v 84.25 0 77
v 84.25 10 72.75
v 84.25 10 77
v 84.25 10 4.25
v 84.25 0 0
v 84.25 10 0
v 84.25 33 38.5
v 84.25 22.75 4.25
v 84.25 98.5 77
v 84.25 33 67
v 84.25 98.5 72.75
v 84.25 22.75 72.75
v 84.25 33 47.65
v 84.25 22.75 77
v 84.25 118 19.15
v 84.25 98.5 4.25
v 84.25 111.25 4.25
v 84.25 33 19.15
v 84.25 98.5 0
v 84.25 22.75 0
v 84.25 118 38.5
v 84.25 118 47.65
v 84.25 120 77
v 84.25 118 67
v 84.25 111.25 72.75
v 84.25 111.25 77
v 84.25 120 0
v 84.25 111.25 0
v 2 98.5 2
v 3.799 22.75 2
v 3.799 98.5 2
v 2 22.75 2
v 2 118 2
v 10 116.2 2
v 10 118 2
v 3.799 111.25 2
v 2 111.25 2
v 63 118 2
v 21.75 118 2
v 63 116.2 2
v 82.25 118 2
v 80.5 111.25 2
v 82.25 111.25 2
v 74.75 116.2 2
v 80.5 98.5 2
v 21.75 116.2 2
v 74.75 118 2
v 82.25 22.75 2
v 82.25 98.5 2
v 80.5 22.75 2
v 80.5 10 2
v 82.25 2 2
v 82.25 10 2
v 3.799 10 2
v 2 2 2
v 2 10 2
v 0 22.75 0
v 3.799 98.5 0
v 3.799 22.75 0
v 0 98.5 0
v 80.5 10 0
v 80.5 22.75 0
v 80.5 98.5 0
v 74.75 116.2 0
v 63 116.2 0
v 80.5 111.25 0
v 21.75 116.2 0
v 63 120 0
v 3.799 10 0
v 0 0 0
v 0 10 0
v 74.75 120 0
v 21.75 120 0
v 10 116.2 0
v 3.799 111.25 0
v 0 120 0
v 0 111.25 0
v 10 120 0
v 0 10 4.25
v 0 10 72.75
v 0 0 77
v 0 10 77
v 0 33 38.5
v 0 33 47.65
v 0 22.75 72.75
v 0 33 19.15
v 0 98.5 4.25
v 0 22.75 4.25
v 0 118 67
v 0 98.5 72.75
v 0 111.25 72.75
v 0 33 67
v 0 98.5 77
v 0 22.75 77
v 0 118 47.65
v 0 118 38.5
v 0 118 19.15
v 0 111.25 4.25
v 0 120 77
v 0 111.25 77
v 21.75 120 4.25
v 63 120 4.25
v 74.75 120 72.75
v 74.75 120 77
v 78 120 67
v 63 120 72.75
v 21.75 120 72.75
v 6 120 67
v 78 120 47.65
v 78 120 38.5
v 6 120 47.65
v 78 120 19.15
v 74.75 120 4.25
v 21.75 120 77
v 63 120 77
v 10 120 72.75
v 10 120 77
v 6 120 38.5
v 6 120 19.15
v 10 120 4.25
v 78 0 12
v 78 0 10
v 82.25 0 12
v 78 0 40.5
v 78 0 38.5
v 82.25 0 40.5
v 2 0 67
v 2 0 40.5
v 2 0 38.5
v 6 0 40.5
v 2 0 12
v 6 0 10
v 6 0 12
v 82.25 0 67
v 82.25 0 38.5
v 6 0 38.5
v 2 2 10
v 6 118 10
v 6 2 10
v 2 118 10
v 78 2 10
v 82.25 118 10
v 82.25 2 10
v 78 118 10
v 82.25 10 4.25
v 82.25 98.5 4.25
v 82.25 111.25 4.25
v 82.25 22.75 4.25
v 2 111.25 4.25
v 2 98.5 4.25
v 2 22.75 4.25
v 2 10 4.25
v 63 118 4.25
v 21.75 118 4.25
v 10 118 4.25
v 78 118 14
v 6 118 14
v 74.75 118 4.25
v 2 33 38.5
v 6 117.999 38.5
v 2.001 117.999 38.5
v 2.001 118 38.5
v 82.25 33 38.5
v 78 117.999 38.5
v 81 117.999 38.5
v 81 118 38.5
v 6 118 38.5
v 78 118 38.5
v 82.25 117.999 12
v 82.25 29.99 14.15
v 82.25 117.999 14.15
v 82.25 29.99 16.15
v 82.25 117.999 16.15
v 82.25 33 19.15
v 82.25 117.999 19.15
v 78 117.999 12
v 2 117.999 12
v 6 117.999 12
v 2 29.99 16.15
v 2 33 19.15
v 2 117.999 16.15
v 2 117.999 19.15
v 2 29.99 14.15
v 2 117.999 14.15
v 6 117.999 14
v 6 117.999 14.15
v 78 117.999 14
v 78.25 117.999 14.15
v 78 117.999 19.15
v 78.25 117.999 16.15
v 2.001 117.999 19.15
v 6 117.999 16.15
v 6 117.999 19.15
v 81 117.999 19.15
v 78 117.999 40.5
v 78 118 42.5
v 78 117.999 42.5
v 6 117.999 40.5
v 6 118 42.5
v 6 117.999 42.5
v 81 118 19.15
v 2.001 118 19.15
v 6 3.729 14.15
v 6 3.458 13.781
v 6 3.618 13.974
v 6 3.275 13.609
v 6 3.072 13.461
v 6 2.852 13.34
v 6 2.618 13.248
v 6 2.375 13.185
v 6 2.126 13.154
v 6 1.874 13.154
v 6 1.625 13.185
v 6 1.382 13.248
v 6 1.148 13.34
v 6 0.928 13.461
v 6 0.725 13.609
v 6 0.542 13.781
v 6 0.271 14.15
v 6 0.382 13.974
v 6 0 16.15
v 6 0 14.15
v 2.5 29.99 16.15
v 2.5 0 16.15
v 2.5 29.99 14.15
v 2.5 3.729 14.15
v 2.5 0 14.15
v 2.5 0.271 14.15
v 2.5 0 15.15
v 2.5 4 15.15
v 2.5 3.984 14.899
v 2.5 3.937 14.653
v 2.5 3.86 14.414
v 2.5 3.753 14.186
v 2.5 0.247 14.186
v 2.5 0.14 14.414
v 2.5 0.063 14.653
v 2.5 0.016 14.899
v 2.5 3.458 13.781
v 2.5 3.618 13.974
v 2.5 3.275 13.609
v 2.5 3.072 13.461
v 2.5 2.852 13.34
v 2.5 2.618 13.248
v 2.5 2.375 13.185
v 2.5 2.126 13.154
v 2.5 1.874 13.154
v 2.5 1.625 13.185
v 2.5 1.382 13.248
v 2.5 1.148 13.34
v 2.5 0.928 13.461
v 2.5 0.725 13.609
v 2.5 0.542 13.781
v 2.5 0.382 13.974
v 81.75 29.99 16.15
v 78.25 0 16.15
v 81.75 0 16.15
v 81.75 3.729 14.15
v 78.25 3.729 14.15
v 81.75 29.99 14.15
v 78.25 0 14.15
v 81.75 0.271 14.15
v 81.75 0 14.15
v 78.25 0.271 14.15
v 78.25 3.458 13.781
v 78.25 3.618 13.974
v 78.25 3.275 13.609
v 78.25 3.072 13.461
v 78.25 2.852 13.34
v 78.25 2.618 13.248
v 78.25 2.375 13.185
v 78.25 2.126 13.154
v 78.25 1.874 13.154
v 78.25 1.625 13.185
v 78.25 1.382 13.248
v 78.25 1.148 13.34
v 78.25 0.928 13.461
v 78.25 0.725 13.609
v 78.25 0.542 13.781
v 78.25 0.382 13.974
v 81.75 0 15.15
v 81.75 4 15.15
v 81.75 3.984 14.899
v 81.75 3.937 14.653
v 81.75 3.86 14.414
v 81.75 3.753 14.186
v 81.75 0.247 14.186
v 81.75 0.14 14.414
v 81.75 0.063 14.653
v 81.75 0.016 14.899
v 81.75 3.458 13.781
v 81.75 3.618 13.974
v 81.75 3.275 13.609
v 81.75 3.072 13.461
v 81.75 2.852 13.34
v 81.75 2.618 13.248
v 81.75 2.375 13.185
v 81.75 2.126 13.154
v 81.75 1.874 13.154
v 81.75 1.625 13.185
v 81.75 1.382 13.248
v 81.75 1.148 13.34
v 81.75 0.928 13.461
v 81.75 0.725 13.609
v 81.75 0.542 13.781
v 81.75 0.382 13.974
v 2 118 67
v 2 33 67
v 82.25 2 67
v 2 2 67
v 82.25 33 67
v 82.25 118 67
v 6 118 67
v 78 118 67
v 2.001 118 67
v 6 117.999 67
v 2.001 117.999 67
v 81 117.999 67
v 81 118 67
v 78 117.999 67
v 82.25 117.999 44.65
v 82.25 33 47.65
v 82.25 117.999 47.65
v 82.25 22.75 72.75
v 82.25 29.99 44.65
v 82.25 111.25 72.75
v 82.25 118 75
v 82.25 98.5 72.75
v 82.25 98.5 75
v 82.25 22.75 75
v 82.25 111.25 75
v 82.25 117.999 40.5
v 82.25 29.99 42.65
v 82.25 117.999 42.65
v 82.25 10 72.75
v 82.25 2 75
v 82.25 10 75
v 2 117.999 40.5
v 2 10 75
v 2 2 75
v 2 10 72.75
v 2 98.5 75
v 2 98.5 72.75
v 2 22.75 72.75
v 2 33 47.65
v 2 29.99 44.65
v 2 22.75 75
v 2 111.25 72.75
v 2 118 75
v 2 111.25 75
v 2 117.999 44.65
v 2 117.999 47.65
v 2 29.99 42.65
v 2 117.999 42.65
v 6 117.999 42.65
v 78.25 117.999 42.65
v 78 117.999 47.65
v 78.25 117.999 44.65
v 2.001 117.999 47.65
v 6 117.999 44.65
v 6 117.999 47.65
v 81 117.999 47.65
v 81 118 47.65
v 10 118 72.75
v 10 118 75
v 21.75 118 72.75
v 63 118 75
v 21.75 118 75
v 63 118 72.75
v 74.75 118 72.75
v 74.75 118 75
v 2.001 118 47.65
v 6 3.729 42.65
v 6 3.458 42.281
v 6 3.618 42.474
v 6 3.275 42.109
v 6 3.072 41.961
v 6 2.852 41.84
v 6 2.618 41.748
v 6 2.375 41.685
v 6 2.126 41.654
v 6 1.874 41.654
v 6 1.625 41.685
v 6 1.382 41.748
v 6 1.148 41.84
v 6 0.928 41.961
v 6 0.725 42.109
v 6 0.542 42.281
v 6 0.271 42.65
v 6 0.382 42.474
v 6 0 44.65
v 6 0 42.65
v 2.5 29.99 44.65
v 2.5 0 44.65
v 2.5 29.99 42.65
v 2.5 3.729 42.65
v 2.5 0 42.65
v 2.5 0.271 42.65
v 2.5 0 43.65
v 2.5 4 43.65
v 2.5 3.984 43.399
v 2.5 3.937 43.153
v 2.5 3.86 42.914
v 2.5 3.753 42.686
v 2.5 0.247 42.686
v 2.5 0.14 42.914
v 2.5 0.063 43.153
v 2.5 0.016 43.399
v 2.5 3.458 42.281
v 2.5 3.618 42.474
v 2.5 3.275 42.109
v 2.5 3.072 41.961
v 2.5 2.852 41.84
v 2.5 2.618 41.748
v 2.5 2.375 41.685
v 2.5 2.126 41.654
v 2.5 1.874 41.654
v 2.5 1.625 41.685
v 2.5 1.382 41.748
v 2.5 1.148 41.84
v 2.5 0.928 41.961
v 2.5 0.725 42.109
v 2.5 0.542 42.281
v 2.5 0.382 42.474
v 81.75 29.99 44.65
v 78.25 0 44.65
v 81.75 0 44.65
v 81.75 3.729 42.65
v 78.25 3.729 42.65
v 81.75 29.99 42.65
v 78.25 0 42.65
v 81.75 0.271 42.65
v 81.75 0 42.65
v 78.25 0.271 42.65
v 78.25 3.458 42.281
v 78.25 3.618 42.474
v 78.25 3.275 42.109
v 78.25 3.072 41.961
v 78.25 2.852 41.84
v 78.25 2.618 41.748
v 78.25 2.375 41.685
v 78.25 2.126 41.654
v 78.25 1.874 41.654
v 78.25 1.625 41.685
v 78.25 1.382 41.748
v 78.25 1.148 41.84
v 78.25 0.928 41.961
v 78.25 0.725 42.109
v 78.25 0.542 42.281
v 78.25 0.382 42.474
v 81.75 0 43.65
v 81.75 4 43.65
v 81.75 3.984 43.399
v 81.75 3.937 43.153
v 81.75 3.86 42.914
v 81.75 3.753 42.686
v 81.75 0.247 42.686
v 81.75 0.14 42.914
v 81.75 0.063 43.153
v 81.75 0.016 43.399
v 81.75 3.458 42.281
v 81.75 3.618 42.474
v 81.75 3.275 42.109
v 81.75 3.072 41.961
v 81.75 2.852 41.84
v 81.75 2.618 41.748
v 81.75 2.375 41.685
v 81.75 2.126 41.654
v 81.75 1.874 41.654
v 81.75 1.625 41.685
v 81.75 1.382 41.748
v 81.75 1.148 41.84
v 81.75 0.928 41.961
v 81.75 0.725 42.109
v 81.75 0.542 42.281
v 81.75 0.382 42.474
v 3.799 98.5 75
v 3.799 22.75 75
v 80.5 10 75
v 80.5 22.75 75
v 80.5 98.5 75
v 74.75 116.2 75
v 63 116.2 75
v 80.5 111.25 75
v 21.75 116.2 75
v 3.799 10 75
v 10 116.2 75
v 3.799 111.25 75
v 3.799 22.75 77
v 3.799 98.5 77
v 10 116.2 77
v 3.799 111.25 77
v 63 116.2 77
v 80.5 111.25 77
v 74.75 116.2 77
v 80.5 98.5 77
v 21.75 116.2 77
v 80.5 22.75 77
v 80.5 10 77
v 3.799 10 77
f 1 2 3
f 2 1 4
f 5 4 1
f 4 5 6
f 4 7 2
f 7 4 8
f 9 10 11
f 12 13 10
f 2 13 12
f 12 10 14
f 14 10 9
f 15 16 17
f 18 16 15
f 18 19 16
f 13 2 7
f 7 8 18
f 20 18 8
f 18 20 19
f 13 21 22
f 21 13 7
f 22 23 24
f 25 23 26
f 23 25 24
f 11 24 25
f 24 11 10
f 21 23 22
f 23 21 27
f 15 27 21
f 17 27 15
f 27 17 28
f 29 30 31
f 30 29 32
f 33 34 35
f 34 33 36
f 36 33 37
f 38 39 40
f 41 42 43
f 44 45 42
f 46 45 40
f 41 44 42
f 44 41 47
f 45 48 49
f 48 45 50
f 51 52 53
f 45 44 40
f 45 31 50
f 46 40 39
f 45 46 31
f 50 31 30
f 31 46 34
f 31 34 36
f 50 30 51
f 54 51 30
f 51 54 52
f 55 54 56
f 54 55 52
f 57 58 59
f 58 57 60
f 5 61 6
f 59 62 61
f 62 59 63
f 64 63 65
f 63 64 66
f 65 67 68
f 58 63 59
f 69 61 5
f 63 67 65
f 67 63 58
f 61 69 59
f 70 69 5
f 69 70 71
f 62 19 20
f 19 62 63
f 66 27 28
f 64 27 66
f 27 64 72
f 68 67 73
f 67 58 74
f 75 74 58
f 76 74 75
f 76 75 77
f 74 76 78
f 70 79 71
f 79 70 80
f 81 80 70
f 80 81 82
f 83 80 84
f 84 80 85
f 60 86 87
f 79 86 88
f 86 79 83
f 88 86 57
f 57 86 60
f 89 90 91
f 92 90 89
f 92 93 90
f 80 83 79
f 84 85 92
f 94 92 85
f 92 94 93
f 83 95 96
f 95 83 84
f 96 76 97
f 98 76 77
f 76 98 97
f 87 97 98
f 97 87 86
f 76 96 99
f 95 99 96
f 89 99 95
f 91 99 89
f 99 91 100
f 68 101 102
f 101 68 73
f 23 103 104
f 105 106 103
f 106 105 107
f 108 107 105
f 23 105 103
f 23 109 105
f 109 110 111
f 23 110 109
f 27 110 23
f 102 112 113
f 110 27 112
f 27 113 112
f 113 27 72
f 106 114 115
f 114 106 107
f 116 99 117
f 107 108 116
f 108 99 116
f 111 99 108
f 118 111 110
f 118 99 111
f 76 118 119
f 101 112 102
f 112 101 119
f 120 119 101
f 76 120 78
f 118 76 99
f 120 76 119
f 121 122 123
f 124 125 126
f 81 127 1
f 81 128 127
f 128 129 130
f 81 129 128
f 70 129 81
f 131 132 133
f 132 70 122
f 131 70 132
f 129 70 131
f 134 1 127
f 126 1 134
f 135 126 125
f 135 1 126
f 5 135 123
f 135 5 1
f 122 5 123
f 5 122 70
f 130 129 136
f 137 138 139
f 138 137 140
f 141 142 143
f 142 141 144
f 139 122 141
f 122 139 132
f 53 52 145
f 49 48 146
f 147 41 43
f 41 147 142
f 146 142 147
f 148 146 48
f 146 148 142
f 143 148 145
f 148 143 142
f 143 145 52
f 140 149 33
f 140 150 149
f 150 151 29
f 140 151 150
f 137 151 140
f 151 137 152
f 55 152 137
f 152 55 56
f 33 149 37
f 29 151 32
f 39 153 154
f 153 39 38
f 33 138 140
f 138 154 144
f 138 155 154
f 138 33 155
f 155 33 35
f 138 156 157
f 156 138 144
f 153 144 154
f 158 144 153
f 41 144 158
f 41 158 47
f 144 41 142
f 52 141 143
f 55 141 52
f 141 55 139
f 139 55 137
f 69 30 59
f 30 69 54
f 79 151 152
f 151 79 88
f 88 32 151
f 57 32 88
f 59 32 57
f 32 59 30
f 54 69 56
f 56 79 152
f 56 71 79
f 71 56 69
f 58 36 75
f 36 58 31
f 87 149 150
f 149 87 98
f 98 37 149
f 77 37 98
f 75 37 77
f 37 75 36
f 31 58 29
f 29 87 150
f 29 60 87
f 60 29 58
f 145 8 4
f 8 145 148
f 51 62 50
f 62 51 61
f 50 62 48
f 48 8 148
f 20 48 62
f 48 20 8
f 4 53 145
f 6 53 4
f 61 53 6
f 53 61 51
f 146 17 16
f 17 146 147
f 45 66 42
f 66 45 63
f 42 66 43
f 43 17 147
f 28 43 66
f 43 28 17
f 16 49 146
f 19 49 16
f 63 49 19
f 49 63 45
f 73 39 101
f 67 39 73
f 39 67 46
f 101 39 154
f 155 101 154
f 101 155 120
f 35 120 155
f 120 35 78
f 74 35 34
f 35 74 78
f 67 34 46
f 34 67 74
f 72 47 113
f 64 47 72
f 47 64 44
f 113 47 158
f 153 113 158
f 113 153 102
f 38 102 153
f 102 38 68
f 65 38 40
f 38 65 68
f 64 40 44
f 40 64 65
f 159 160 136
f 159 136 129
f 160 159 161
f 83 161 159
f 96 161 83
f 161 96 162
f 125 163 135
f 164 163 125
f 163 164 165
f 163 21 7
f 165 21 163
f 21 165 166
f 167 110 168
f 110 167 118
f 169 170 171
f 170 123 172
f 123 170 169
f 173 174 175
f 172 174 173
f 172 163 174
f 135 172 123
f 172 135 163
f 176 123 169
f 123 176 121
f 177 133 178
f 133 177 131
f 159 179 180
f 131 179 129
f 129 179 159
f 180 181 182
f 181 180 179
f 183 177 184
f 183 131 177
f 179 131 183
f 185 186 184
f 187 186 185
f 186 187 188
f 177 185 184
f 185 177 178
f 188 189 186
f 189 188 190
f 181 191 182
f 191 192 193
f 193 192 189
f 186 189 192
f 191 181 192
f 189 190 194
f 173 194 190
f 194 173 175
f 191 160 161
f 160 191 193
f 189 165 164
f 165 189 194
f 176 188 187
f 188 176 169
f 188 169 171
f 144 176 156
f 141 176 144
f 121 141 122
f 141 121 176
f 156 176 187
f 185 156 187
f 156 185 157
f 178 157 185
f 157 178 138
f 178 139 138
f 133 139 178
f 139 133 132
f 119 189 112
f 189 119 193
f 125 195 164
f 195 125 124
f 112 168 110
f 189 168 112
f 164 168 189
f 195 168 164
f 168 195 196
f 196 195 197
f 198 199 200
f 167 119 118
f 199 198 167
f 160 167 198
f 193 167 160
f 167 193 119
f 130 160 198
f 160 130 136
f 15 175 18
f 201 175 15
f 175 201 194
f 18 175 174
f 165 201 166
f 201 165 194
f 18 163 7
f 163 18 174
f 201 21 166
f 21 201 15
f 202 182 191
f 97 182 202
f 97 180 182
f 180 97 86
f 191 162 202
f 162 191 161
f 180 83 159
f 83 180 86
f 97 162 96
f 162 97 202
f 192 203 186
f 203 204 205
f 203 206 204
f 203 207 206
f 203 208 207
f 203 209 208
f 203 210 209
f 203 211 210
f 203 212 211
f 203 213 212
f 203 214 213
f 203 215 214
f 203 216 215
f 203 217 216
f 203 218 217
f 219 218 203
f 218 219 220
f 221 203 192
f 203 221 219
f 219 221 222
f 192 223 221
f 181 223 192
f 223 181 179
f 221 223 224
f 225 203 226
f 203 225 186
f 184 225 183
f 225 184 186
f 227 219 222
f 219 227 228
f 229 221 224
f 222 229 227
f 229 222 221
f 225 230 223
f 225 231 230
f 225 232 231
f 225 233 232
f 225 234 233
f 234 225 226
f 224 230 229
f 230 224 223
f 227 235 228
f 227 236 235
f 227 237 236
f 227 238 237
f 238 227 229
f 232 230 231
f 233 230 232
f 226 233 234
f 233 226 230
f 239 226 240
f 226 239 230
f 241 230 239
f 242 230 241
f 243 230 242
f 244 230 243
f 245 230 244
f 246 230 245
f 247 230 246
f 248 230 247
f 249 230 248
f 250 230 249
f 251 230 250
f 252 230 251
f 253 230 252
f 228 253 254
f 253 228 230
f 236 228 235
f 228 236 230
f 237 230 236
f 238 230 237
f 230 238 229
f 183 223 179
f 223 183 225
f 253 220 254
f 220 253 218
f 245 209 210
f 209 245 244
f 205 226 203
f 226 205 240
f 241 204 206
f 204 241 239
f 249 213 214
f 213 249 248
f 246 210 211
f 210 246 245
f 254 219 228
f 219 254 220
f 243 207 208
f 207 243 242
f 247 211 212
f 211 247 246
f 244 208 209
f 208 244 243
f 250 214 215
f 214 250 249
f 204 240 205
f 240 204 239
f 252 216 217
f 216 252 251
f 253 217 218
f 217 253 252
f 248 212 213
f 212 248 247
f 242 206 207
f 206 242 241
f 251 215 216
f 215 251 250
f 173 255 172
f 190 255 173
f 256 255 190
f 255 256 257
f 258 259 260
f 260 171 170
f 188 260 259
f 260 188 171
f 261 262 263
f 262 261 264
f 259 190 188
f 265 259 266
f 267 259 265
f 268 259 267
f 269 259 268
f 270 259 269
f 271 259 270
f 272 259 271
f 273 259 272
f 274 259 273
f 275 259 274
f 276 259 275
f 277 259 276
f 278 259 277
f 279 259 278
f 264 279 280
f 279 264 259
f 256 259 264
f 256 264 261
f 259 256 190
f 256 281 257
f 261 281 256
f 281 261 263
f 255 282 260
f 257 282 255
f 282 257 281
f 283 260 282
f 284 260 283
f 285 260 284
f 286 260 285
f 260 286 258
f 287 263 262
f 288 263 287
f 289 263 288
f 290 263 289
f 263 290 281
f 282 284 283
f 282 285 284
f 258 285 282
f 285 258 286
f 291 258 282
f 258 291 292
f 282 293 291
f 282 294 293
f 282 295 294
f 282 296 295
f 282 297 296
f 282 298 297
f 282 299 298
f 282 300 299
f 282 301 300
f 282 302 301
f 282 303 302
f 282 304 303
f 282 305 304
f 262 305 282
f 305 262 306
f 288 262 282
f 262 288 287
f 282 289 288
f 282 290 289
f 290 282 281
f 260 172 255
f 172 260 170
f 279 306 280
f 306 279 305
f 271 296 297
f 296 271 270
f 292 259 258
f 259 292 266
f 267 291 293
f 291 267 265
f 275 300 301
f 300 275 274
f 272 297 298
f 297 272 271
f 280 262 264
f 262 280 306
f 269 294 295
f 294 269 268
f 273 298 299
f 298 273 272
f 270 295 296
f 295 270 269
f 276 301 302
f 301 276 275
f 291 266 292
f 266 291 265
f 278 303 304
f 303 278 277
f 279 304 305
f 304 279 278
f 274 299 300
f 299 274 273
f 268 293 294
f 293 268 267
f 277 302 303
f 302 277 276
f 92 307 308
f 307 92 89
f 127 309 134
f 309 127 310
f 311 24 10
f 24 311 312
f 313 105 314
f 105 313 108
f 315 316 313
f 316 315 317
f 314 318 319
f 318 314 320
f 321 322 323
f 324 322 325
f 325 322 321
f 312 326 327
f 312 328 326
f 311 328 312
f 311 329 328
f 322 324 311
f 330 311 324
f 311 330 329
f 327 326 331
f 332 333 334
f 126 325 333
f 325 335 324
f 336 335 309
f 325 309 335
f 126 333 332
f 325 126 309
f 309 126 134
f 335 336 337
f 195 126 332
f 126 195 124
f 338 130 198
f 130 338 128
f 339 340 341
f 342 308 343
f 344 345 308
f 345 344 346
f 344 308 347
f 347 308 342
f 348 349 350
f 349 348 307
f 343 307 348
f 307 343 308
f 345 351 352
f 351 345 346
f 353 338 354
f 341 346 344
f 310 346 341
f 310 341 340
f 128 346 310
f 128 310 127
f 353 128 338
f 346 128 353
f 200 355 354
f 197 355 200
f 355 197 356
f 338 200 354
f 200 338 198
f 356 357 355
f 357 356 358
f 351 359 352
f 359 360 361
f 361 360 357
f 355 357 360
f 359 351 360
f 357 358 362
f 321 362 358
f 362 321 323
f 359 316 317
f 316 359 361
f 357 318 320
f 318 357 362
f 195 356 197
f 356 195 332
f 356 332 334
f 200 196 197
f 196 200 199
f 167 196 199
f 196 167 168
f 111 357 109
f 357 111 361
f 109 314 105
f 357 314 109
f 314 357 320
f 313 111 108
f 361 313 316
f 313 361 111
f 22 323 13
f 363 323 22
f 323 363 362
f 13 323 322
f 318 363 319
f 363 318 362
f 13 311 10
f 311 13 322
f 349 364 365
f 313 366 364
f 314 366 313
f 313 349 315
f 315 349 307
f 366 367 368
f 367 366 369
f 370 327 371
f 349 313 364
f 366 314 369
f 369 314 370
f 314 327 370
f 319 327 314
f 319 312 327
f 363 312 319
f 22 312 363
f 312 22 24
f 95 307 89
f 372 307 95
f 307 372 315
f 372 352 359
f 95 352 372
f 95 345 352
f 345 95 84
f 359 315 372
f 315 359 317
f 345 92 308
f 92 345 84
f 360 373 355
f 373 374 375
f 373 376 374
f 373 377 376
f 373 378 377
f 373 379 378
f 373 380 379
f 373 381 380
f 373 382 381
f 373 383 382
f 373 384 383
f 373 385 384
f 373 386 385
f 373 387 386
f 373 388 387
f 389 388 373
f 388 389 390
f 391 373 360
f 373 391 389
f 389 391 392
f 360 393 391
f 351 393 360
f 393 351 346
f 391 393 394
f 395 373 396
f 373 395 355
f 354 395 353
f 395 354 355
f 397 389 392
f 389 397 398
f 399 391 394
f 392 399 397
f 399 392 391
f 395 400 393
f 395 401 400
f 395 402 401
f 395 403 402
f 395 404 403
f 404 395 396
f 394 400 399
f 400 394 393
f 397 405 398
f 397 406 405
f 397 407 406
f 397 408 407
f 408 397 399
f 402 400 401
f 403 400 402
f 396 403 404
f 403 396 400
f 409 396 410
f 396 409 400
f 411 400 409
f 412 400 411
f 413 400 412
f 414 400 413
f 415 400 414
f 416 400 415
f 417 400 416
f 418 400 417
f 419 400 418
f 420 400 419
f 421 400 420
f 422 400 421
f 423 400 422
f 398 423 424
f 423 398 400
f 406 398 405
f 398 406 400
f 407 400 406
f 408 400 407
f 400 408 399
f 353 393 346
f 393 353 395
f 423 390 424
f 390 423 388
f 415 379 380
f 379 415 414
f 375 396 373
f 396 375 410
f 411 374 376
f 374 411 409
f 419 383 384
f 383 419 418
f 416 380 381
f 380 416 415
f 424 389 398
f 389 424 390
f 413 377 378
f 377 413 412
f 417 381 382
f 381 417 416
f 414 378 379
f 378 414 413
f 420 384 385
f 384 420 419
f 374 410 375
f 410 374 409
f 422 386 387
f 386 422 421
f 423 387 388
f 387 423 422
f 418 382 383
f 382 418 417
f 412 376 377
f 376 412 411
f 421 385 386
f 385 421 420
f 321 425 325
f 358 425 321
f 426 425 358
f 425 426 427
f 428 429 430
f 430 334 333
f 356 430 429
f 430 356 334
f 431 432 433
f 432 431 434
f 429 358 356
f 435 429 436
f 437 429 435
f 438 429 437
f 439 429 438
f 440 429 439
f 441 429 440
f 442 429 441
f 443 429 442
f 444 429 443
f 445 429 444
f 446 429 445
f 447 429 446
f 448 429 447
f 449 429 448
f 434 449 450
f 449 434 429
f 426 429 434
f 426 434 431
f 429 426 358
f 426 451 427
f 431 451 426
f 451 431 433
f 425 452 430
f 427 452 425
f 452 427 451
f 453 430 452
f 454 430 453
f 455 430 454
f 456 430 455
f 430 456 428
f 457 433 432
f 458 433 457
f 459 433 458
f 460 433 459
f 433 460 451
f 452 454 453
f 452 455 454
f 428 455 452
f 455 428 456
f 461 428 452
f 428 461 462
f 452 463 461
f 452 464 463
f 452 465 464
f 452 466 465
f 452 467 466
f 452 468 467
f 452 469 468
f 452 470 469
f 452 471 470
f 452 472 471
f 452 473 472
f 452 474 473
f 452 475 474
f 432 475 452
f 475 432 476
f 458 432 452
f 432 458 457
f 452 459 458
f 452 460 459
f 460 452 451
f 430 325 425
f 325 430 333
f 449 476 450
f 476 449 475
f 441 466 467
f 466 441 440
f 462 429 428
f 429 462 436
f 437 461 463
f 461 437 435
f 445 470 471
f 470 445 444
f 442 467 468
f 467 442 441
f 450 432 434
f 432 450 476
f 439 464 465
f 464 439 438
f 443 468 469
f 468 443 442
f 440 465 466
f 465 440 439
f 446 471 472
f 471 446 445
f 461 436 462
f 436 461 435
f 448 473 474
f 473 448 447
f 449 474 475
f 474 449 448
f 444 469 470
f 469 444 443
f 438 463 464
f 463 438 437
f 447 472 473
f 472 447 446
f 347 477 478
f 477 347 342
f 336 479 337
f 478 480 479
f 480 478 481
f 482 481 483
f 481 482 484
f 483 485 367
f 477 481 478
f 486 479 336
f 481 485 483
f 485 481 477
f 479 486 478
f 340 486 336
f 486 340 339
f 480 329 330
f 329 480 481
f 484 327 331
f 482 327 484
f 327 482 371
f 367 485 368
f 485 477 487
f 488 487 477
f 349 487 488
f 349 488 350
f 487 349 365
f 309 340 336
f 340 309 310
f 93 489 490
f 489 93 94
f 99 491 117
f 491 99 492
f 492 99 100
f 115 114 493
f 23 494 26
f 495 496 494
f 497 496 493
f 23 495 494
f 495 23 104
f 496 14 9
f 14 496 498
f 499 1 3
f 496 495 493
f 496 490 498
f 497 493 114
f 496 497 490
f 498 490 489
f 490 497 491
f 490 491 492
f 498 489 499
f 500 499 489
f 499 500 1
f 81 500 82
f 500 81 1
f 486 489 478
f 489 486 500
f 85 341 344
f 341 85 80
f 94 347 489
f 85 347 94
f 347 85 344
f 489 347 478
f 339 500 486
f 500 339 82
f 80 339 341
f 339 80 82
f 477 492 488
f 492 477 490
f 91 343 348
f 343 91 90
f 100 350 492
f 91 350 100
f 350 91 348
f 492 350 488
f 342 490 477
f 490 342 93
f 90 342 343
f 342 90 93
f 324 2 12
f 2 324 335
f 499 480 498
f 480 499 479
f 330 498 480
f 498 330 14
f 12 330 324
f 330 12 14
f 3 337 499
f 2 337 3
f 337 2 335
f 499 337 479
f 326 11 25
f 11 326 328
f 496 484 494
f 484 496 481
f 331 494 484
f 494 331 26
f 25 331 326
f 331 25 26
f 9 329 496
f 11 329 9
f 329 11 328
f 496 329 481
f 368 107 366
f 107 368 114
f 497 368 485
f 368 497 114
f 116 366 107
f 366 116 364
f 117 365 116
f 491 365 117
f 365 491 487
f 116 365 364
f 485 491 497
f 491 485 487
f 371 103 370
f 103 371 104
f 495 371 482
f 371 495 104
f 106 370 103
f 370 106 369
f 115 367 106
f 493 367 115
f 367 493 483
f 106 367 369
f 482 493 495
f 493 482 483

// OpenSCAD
// file: ../patterns/design-patterns.scad
/*
**
** Design Patterns Library
**
*/
// Programmatic design patterns
//
// Author: Steven Nemetz
//
// Designs are centered on the origin
//
// Current version GitHub: https://github.com/snemetz/OpenSCAD-Modules/
// Thingiverse Customizable: http://www.thingiverse.com/thing:
/*
  REVISION HISTORY
  v0.2 Add spiral & voronoi
  v0.1 Hex/Honeycomb & Grid patterns
*/
// TODO:
//    round holes w/ box option ??
//  More Design Patterns:
//    look at Fibonacci
//    snowflake- can have multiple ones - issues when not square/round
//    convex pentagons - can have multiple ones

Width     = 40;
Height    = 40;
Diameter  = 6;
Spacing   = 1.2;
Thickness = 2;

// Library Modules
//    standardize Parameters & resulting object size, location, etc
// gridCutout(width, height, cubeSize, spacing, thick)
// honeycombCutout(width, height, diameter, spacing, thick)
// spiralCutout(width, height, thick)
// voronoiCutout(width, height, thick)

/*
** Grid
*/
module gridCutout(width, height, cubeSize, spacing, thick) {
  offset = cubeSize + spacing;
  cols = width / offset;
  rows = height / offset;
  translate([-width/2, -height/2, 0])
  resize([width, height, 0])
    for (i=[0:rows-1]) {
      for (j=[0:cols-1]) {
        translate([j*offset, i*offset, 0])
          cube([cubeSize, cubeSize, thick]);
      }
    }
}

/*
** Honeycomb
*/
module hexHoles(width, height, hexDia, spacing, thick) {
  hOffset = hexDia + spacing;
  vOffset = sqrt(pow(hOffset,2)-pow(hOffset/2,2));
  cols = width / hOffset;
  rows = height / vOffset;
  translate([hexDia/2, hexDia/2, 0])
    for (i=[0:rows-1]) {
      for (j=[0:cols-1]) {
        translate([j*hOffset+i%2*(hOffset/2), i*vOffset, 0])
          cylinder(h=thick, r=hexDia/2, $fn=6);
      }
    }
}
module honeycombCutout(width, height, diameter, spacing, thick) {
  translate([-width/2, -height/2, 0])
  difference() {
    cube([width, height, thick]);
    translate([-0.01,-0.01,-0.01])
      difference(){
        cube([width+1, height+1, thick+2]);
        translate([-diameter/2, -diameter/2, -0.01])
          hexHoles(width+diameter+spacing, height+diameter+spacing, diameter, spacing, thick);
      }
  }
}

/*
** Spiral
*/
// spirals   = how many spirals
// thickness = how thick you want the arms to be
// rmax      = maximum radius
// FIX: Has errors at certain values. First and last circle errors with small rmax
// FIX: Larger than max radius
module archimedean_spiral(spirals=1, thickness=1, rmax = 100) {
    s = spirals*360;
    t = thickness;
    a = sqrt(pow(rmax,2)/(pow(s,2)*(pow(cos(s),2) + pow(sin(s),2))));
    points=[
        for(i = [0:$fa:s]) [
            (i*a)*cos(i),
            (i*a)*sin(i)
        ]
    ];
    points_inner=[
        for(i = [s:-$fa:0]) [
            (((i*a)+t)*cos(i)),
            (((i*a)+t)*sin(i))
        ]
    ];
    polygon(concat(points,points_inner));
}
module spiralCutout(width, height, thick) {
  translate([-thick/2, 0, 0])
    linear_extrude(thick) resize([width, height, 0])
      archimedean_spiral(5,5,50);
}

/*
** Voronoi
*/
// (c)2013 Felipe Sanches <juca@members.fsf.org>
// licensed under the terms of the GNU GPL version 3 (or later)
function normalize(v) = v/(sqrt(v[0]*v[0] + v[1]*v[1]));

module voronoi(points, L=200, thickness=1, round=6, nuclei=true) {
	for (p=points) {
		difference() {
			minkowski() {
			  intersection_for(p1=points) {
				  if (p!=p1) {
            angle=90+atan2(p[1]-p1[1], p[0]-p1[0]);
					  translate((p+p1)/2 - normalize(p1-p) * (thickness+round))
					 	  rotate([0,0,angle])
						    translate([-L,-L])
						      square([2*L, L]);
				  } // if
			  } // intersection_for
		    circle(r=round, $fn=20);
		  } // minkowski
		  if (nuclei)
			  translate(p) circle(r=1, $fn=20);
		} // difference
	} // for
} // end module

module random_voronoi(n=20, nuclei=true, L=200, thickness=1, round=6, min=0, max=100, seed=42){
	x = rands(min, max, n, seed);
	y = rands(min, max, n, seed+1);
	for (i=[0:n-1]) {
		difference() {
			minkowski() {
			  intersection_for(j=[0:n-1]) {
          if (i!=j) {
            p=[x[i],y[i]];
            p1=[x[j],y[j]];
            angle=90+atan2(p[1]-p1[1], p[0]-p1[0]);
					  translate((p+p1)/2 - normalize(p1-p) * (thickness+round))
							rotate([0,0,angle])
							  translate([-L,-L])
							    square([2*L, L]);
				  }
			  }
			  circle(r=round, $fn=20);
			}
			if (nuclei)
			  translate([x[i],y[i]]) circle(r=1, $fn=20);
		}
	}
}
module voronoiCutout(width, height, thick) {
  // adjust seed: prime? 13, 17
  translate([-width/2, -height/2, 0])
  difference() {
    cube([width, height, thick]);
    translate([-0.01,-0.01,-0.01])
      difference(){
        cube([width+1, height+1, thick+2]);
        translate([width/6, height/10, -0.01]) resize([width+5, height+5, thick])
          linear_extrude(thick+3)
            random_voronoi(n=40, round=5, min=10, max=300, thickness=4, nuclei=false);
     }
  }
}

/*
** Display design patterns
*/

// Grid
translate([Width/2, Height/2, 0])
  gridCutout(Width, Height, Diameter, Spacing, Thickness);
// Honeycomb
translate([-Width/2, Height/2, 0])
  honeycombCutout(Width, Height, Diameter, Spacing, Thickness);
// Spiral
translate([-Width/2, -Height/2, 0])
  spiralCutout(Width, Height, Thickness);
// Voronoi
translate([Width/2, -Height/2, 0])
  voronoiCutout(Width, Height, Thickness);





//
// main file
/*
**
** Rack Module
**
*/
// Generic computer rack by using mounting plates that can support any small computer boards
//
// Author: Steven Nemetz
//
// Current version GitHub: https://github.com/snemetz/OpenSCAD-Modules/tree/master/cluster-rack
// Thingiverse Customizable: http://www.thingiverse.com/thing:1538381
/*
  REVISION HISTORY
  v0.3 Add modular connectors
  v0.2 Add cutout designs and cutout controls
  v0.1 Initial working version
*/

// TODO:
// Future ideas:
//  known board/hd U heights
//  see about designing to not need support
//  modular with clips: 1 side holes, 1 side clips - do for side & top/bottom
//    options: either, both, none. Only clips/holes for ends
//  Create cable managements clips and/or clip strips. Adjustable sizes for different amounts of cables
//    possible to add another hole on bottom side of back if needed
//
// build: 10 x 4 or 5 x 2 x4

// START CUSTOMIZER DATA

// What to print?
PrintDesign = "Rack"; // [Rack, ClipCenter: Clip Center, ClipEnd:Clip End]
// Number of rack slots
Slots      = 2;    // [1:12]
SlotHeight = 28.5; // Space between slots or space including slot
// Add slot to allow units to connect to each other
Modular    = true; // [true, false]
/* [Mount Plate Info] */
// Length
PlateX  = 112;
// Width
PlateY  = 80;
// Thickness
PlateZ  = 1.5;
// Standoff posts height
PostHeight  = 5;
/* [Info on what is mounted on plate] */

/* [Case Designs] */
// Left side cutout design
LeftDesign  = "Open"; // [Open, Grid, Honeycomb, Solid, Voronoi]
// Length: only applies to Open design
LeftLength  = 85;
// Right side cutout design
RightDesign = "Open"; // [Open, Grid, Honeycomb, Solid, Voronoi]
// Length: only applies to Open design
RightLength = 85;
// Back cutout design
BackDesign  = "Open"; // [Open, Grid, Honeycomb, Solid, Voronoi]
// Top and Bottom End cutout design
EndDesign   = "Solid"; // [Grid, Honeycomb, Solid, Voronoi]

/* [Hidden] */
Ledge = 4;
Wall  = 2;
BackWall    = Wall*2;
Designs     = [LeftDesign, BackDesign, RightDesign, EndDesign];
DesignLens  = [LeftLength, RightLength];
PlateDim    = [PlateX, PlateY, PlateZ];
BoardHeight = 18; // RPiB+
//U = BoardHeight + wall + PlateZ + PostHeight; // + headroom
// 18 + 1.5 + 5 = 24.5 // Board + plate height
// + wall*2 = 28.5

//preview[view:east, tilt:top]
//port_height=11;
//port_len=61;

// END CUSTOMIZER DATA
use <../patterns/design-patterns.scad>;

// Design Cutouts
//	Parameters
//    design    : design name
//    width     : design width
//    length    : design length
//    thickness : design thickness
module design(design, width, length, thickness) {
  //echo(str("D:",design,"\tW:",width,"\tL:",length,"\tT:",thickness));
  if (design == "Open") {
    cube([width, length, thickness]);
  } else if (design == "Grid") {
    translate([width/2, length/2, 0])
      gridCutout(width, length, 6, 1.8, thickness);
  } else if (design == "Honeycomb") {
    translate([width/2, length/2, 0])
      honeycombCutout(width, length, 6, 1.2, thickness);
  } else if (design == "Voronoi") {
    translate([width/2, length/2, 0])
      voronoiCutout(width, length, thickness);
  }
}

module connectorSlot() {}
// Parameters: wall thickness,
// TODO: change all to vars & Parameters & calc
module connectorClip(x,y,z)  {
  thickness = 2;
  union(){
    // back support - will be on solid wall, but might need to make thicker
    translate([0, 0, -z*1.5+thick/2])
      cube(size=[thickness, y, z*3]); // z too much
    //translate([0,y/2,0]) rotate ([0,90,0]) cylinder(h=z/2,r=y/2);
    // wall thickness to clip
    cube(size=[x, y, thickness]);
    // height of clip end
    translate([x, 0, 0])
      cube(size=[thickness, y, z]);
    // slant end for easier insertion
    translate([x, 0, z]) resize([thickness, y, thickness])
      rotate([180, -90, 90])
        linear_extrude(height=1)
          polygon([[0, 0], [0, 2.0], [1.5, 2.0]]);
  }
}
module dovetail(width=9, height=10, male=true) {
  w= (male==true) ? width*0.975 : width;
  translate([2.4, 0, 0])
    union(){
      rotate([0, 0, -30])
        translate([-w/2, -sqrt(3)*w/6, -height/2])
          linear_extrude(height=height)
            polygon(points=[[0,0],[w,0],[w/2,sqrt(3)*w/2]]);
      translate([-4.5, 0, 0])
        cube([4.2, width*1.5, height], center=true);
    }
}
//clip(7,20,20);
// Redo all calc if use. Need absolute sizing

//  Create a rack end
//    TODO:
//      module clips (hole/clip) to connect cases together
//      force design to Solid if clips are selected
//      look at possible connector designs
//        clip, lego, external clips (might be best - like CD drawers), slide joint(dovetail?)
//      Add space on ends to give space for modular connectors
//        union difference cube (same size as end) cube (center cutout just leave 4 edges)
//	Parameters
//    plateDim  : [x, y, z]
//    wall      : wall thickness
//    backWall  : back wall thickness
//    ledge     : rack slide width
//    tolerance : printer tolerance gap to ensure smooth sliding
//    design    : design name
module rackEnd(plateDim, wall, backWall, ledge, tolerance, design) {
  difference () {
    // clip = wall*2 // don't be relative to wall
    cube([plateDim[1]+2*wall+tolerance, plateDim[0]+wall*2+backWall, wall]);
    translate([wall+ledge, 2*wall, -0.001])
      design(design, plateDim[1]-2*ledge, plateDim[0], 2*wall);
  }
}
module modularSpacer(plateDim, wall, backWall, ledge, tolerance, height) {
  // create 4 sides to match walls
  // FIX: front wall too thick (4mm? reduce to 2 or 3?) - done
  // TODO: reduce hieght of front wall or remove ?
  difference () {
    cube([plateDim[1]+2*wall+tolerance, plateDim[0]+wall*2+backWall, height]); // z = spacer height
    translate([wall, wall, -0.001])
      cube([plateDim[1]+tolerance, plateDim[0]+2*wall, height*2]); // z = spacer height *2
  }
}
// Create the top half of the rack slide
//	Parameters
//    plateDim  : [x, y, z]
//    ledge     : rack slide width
//    wall      : wall thickness
//    backWall  : back wall thickness
//    left      : Is this the left side? (Boolean)
module rack_slide_top(plateDim, ledge, wall, backWall, left) {
  // TODO: make thicker or widther top slide to make flex clip stronger
  // TODO: reduce clip height. sm size sykinder but merge higher into slide
  // clip = wall*2 // r = wall // don't be relative to wall
  cutWidth = 0.5;
  cutLen   = 30;
  offsetCut  = (left) ? 0 : ledge-cutWidth;
  offsetClip = (left) ? cutWidth : 0;
  union() {
    difference() {
      cube([ledge, plateDim[0]+wall*2+backWall, wall]);
      // cut slot, so end can flex
      translate([offsetCut, -0.01, -0.01])
        cube([cutWidth, cutLen, wall+0.02]);
    }
    // Add end clip
    translate([offsetClip, wall, wall/2]) rotate([90,0,90])
      difference() {
        // height = flex clip width
        cylinder(r=wall, h=ledge-cutWidth, center=false, $fn=50);
        translate([-wall, -0, -0.01])
          cube([wall*2, wall*2, wall*4]);
      }
  }
}

// Create 1 unit of a rack case
//	Parameters
//    plateDim  : [x, y, z]
//    wall      : wall thickness
//    backWall  : back wall thickness
//    uHeight   : height of 1 unit
//    ledge     : rack slide width
//    tolerance : printer tolerance gap to ensure smooth sliding
//    designs   : Vector of design names [left, back, right, ends]
//    designLens: [left, right]
module rack1U(plateDim, wall, backWall, uHeight, ledge, tolerance=0.25, designs, designLens) {
  // back is wall*3
  // TODO: Reduce wall thickness by wall
  //boardLen    = 85; //Rpi 92 //BPi
  //portHeight  = 12; // cacl same as back height
  postHeight  = 5;
  minSlideGap = 2.15;
  gap = (plateDim[2]+tolerance < minSlideGap) ? minSlideGap - plateDim[2] : tolerance;
  clip = wall*2;

  union() {
    difference(){
      // 1 U block
      cube([plateDim[1]+2*wall+tolerance, plateDim[0]+clip+backWall, uHeight]);
      // Main Area cut out. Turn into a tray. No top or front
      translate([wall, -0.001, wall])
        cube([plateDim[1]+tolerance, plateDim[0]+clip+wall, uHeight]); // why wall*3 ? -> clip
      // Floor cut out. Only leave ledge
      translate([wall+ledge, -wall, -wall])
        cube([plateDim[1]-2*ledge, plateDim[0]+wall*4, 3*wall]); // why wall*4 ? -> clip
      // Back cut out
      translate([wall+ledge, plateDim[0]+wall*2+0.001, wall+gap+postHeight+plateDim[2]])
        rotate([0,-90,-90])
          design(designs[1], uHeight-gap-wall-postHeight, plateDim[1]-ledge*2, 2*backWall);
      // FIX: lower sides & back slightly and increase height- Reduce by 1?
      // Right cut out
      rightLen = (designs[2] == "Open") ? designLens[1] : plateDim[0];
      translate([plateDim[1]+2*wall+1, plateDim[0]-rightLen+clip+wall, wall+plateDim[2]+gap+postHeight])
        rotate([0,-90,0])
          design(designs[2], uHeight-gap-wall-postHeight, rightLen, 2*wall);
      // Left cut out
      leftLen = (designs[0] == "Open") ? designLens[0] : plateDim[0];
      translate([wall+0.001, plateDim[0]-leftLen+clip+wall, wall+plateDim[2]+gap+postHeight])
        rotate([0,-90,0])
          design(designs[0], uHeight-gap-wall-postHeight, leftLen, 2*wall);
    }
    // Add slides with flex clip ends to hold plate
    translate([wall, 0, gap+wall+plateDim[2]])
      rack_slide_top(plateDim, ledge, wall, backWall, true);
    translate([wall+plateDim[1]+tolerance-ledge, 0, gap+wall+plateDim[2]])
      rack_slide_top(plateDim, ledge, wall, backWall, false);
  }
}

// Cut slots for modular connection clips
//	Parameters
//    plateDim  : [x, y, z]
//    wall      : wall thickness
//    backWall  : back wall thickness
//    clip      : [clipLen, clipHeight, clipWall]
//    tolerance : side wall tolerance
//    top       : is placement of slots for top or bottom?
module modularSlots(plateDim, wall, backWall, clip, tolerance, top) {
  // TODO: fix exact placement
  // FIX: cut holes slightly deeper - clips don't fit flush
  offsetZ = (top) ? wall+clip[1]/2 - tolerance : -clip[1]/2 + tolerance;
  // Side Modular Slots
  // FIX: sides are 1mm short - Check after not rotate and + 1
  // Issue with rotate or printer (z axis accuracy)?
  for (x=[-0.001, plateDim[1]+2*tolerance]) {
    for (y=[10, plateDim[0]+backWall+2*wall-10-clip[0]]) {
      translate([x, y, offsetZ])
        cube([clip[2]+wall, clip[0]+tolerance+1, clip[1]]);
    }
  }
/*  for (x=[wall+clip[2]-0.001, plateDim[1]+wall+clip[2]+2*tolerance]) {
    for (y=[10, plateDim[0]+backWall+2*wall-10-clip[0]]) {
      translate([x, y, offsetZ]) rotate([0, 0, 90])
        cube([clip[0]+tolerance, clip[2]+wall, clip[1]]); // x needs to be larger on sides than end for some reason
        // maybe change dim instead of rotate?
    }
  }*/
  // Back Modular Slots
  for (x=[10, plateDim[1]+wall*2+tolerance*2-clip[0]-10]) {
    translate([x, plateDim[0]+backWall+wall-clip[2], offsetZ]) // Fix y calc reduce slightly
      cube([clip[0]+tolerance, (clip[2]+wall)*2, clip[1]]);
  }
}

// Create a rack case
//	Parameters
//    plateDim  : [x, y, z]
//    wall      : wall thickness
//    backWall  : back wall thickness
//    slots     : number of rack slots
//    slotHeight: height of 1 unit
//    ledge     : rack slide width
//    designs   : Vector of design names [left, back, right, ends]
//    designLens: [left, right]
// ADD: modular
//  TODO:
//    add spacing at ends for clip space - create module for
//      match top wider part of clip depth = clipHeight/2
//    add cutouts for clips - if using external clips
//      12.5 from end X, 5 from end y
//      cut 12.1 x (clipLen+tolerance), clipHeight/2 z - match top wider part of clip depth
module rack(plateDim, wall, backWall, slots, slotHeight, ledge, designs, designLens, modular) {
  tolerance  = 0.25;
  clipHeight = 8;
  clipLen    = 11.5;
  clipWall   = 1.8;
  clip       = [clipLen, clipHeight, clipWall];
  translate([])
    difference() {
      union() {
        rackEnd(plateDim, wall, backWall, ledge, tolerance, designs[3]);
        translate([0,0,wall])
          modularSpacer(plateDim, wall, backWall, ledge, tolerance, clipHeight);
      }
      if (modular) modularSlots(plateDim, wall, backWall, clip, tolerance, false);
    }
  translate([0,0,wall+clipHeight])
    for(i=[1:slots]){
      translate([0,0,(i-1)*slotHeight])
      rack1U(plateDim, wall, backWall, slotHeight, ledge, tolerance, designs, designLens);
    }
  translate([0,0,slots*slotHeight+wall+clipHeight])
    difference() {
      union() {
        modularSpacer(plateDim, wall, backWall, ledge, tolerance, clipHeight);
        translate([0,0,clipHeight])
          rackEnd(plateDim, wall, backWall, ledge, tolerance, designs[3]);
      }
      if (modular) modularSlots(plateDim, wall, backWall, clip, tolerance, true);
    }
}

// External clips
module clipEndWall(clipLen, clipHeight, clipWall) {
  // add bumb to end to lock in place
  // round/slant top edge for easier insert ?
  rotate ([90,0,0])
    difference() {
      cube([clipLen, clipHeight, clipWall]);
      translate([clipLen, 5, -0.001]) rotate([0,0,45]) cube(5);
    }
}
module clipEnd(clipLen=11.5, clipHeight=8, clipWall=1.8, caseWall=2, center=false) {
  clipWidth = caseWall*2 + clipWall*2;
  centerCut = (center) ? 1 : 2;
  // sides
  translate([0,clipWall,0]) clipEndWall(clipLen, clipHeight, clipWall);
  translate([0,clipWidth,0]) clipEndWall(clipLen, clipHeight, clipWall);
  // top - 2
  difference() {
    cube([clipLen, clipWidth, clipHeight / 2]); // z ? clipHeight / 2 = 4 ~ (1.925) 4.15 ?
    // Cut center
    translate([1.4, clipWall+caseWall*0.25, centerCut])
      cube([clipLen, caseWall*1.5, clipHeight]);
    // Cut end
    translate([clipLen-0.7, clipWall+caseWall*0.25, -0.7])
      rotate([0,-45,0])
        cube([caseWall*3, caseWall*1.5, caseWall*3]);
  }
}
module clipCenter(caseWall) {
  clipWall  = 1.8;
  clipWidth = caseWall*2+clipWall*2;
  rotate([0,-90,0])
    clipEnd(caseWall=caseWall, center=true);
  translate([0, clipWidth, 0])
    rotate([0,-90,180])
      clipEnd(caseWall=caseWall, center=true);
}

// Customizer code

if (PrintDesign == "ClipCenter") {
  clipCenter(Wall);
} else if (PrintDesign == "ClipEnd") {
  clipEnd(caseWall=Wall);
} else if (PrintDesign == "Rack") {
// rotate to make printable
// fix to account for added modularSpacer
//translate([(Slots*SlotHeight)/2,-(PlateDim[1]+2*Wall)/2,PlateDim[0]+BackWall+Wall*2])
  //rotate([-90,0,90])
    rack(PlateDim, Wall, BackWall, Slots, SlotHeight, Ledge, Designs, DesignLens, Modular);
} else {
  echo("ERROR: unknown design to print");
}

// END
